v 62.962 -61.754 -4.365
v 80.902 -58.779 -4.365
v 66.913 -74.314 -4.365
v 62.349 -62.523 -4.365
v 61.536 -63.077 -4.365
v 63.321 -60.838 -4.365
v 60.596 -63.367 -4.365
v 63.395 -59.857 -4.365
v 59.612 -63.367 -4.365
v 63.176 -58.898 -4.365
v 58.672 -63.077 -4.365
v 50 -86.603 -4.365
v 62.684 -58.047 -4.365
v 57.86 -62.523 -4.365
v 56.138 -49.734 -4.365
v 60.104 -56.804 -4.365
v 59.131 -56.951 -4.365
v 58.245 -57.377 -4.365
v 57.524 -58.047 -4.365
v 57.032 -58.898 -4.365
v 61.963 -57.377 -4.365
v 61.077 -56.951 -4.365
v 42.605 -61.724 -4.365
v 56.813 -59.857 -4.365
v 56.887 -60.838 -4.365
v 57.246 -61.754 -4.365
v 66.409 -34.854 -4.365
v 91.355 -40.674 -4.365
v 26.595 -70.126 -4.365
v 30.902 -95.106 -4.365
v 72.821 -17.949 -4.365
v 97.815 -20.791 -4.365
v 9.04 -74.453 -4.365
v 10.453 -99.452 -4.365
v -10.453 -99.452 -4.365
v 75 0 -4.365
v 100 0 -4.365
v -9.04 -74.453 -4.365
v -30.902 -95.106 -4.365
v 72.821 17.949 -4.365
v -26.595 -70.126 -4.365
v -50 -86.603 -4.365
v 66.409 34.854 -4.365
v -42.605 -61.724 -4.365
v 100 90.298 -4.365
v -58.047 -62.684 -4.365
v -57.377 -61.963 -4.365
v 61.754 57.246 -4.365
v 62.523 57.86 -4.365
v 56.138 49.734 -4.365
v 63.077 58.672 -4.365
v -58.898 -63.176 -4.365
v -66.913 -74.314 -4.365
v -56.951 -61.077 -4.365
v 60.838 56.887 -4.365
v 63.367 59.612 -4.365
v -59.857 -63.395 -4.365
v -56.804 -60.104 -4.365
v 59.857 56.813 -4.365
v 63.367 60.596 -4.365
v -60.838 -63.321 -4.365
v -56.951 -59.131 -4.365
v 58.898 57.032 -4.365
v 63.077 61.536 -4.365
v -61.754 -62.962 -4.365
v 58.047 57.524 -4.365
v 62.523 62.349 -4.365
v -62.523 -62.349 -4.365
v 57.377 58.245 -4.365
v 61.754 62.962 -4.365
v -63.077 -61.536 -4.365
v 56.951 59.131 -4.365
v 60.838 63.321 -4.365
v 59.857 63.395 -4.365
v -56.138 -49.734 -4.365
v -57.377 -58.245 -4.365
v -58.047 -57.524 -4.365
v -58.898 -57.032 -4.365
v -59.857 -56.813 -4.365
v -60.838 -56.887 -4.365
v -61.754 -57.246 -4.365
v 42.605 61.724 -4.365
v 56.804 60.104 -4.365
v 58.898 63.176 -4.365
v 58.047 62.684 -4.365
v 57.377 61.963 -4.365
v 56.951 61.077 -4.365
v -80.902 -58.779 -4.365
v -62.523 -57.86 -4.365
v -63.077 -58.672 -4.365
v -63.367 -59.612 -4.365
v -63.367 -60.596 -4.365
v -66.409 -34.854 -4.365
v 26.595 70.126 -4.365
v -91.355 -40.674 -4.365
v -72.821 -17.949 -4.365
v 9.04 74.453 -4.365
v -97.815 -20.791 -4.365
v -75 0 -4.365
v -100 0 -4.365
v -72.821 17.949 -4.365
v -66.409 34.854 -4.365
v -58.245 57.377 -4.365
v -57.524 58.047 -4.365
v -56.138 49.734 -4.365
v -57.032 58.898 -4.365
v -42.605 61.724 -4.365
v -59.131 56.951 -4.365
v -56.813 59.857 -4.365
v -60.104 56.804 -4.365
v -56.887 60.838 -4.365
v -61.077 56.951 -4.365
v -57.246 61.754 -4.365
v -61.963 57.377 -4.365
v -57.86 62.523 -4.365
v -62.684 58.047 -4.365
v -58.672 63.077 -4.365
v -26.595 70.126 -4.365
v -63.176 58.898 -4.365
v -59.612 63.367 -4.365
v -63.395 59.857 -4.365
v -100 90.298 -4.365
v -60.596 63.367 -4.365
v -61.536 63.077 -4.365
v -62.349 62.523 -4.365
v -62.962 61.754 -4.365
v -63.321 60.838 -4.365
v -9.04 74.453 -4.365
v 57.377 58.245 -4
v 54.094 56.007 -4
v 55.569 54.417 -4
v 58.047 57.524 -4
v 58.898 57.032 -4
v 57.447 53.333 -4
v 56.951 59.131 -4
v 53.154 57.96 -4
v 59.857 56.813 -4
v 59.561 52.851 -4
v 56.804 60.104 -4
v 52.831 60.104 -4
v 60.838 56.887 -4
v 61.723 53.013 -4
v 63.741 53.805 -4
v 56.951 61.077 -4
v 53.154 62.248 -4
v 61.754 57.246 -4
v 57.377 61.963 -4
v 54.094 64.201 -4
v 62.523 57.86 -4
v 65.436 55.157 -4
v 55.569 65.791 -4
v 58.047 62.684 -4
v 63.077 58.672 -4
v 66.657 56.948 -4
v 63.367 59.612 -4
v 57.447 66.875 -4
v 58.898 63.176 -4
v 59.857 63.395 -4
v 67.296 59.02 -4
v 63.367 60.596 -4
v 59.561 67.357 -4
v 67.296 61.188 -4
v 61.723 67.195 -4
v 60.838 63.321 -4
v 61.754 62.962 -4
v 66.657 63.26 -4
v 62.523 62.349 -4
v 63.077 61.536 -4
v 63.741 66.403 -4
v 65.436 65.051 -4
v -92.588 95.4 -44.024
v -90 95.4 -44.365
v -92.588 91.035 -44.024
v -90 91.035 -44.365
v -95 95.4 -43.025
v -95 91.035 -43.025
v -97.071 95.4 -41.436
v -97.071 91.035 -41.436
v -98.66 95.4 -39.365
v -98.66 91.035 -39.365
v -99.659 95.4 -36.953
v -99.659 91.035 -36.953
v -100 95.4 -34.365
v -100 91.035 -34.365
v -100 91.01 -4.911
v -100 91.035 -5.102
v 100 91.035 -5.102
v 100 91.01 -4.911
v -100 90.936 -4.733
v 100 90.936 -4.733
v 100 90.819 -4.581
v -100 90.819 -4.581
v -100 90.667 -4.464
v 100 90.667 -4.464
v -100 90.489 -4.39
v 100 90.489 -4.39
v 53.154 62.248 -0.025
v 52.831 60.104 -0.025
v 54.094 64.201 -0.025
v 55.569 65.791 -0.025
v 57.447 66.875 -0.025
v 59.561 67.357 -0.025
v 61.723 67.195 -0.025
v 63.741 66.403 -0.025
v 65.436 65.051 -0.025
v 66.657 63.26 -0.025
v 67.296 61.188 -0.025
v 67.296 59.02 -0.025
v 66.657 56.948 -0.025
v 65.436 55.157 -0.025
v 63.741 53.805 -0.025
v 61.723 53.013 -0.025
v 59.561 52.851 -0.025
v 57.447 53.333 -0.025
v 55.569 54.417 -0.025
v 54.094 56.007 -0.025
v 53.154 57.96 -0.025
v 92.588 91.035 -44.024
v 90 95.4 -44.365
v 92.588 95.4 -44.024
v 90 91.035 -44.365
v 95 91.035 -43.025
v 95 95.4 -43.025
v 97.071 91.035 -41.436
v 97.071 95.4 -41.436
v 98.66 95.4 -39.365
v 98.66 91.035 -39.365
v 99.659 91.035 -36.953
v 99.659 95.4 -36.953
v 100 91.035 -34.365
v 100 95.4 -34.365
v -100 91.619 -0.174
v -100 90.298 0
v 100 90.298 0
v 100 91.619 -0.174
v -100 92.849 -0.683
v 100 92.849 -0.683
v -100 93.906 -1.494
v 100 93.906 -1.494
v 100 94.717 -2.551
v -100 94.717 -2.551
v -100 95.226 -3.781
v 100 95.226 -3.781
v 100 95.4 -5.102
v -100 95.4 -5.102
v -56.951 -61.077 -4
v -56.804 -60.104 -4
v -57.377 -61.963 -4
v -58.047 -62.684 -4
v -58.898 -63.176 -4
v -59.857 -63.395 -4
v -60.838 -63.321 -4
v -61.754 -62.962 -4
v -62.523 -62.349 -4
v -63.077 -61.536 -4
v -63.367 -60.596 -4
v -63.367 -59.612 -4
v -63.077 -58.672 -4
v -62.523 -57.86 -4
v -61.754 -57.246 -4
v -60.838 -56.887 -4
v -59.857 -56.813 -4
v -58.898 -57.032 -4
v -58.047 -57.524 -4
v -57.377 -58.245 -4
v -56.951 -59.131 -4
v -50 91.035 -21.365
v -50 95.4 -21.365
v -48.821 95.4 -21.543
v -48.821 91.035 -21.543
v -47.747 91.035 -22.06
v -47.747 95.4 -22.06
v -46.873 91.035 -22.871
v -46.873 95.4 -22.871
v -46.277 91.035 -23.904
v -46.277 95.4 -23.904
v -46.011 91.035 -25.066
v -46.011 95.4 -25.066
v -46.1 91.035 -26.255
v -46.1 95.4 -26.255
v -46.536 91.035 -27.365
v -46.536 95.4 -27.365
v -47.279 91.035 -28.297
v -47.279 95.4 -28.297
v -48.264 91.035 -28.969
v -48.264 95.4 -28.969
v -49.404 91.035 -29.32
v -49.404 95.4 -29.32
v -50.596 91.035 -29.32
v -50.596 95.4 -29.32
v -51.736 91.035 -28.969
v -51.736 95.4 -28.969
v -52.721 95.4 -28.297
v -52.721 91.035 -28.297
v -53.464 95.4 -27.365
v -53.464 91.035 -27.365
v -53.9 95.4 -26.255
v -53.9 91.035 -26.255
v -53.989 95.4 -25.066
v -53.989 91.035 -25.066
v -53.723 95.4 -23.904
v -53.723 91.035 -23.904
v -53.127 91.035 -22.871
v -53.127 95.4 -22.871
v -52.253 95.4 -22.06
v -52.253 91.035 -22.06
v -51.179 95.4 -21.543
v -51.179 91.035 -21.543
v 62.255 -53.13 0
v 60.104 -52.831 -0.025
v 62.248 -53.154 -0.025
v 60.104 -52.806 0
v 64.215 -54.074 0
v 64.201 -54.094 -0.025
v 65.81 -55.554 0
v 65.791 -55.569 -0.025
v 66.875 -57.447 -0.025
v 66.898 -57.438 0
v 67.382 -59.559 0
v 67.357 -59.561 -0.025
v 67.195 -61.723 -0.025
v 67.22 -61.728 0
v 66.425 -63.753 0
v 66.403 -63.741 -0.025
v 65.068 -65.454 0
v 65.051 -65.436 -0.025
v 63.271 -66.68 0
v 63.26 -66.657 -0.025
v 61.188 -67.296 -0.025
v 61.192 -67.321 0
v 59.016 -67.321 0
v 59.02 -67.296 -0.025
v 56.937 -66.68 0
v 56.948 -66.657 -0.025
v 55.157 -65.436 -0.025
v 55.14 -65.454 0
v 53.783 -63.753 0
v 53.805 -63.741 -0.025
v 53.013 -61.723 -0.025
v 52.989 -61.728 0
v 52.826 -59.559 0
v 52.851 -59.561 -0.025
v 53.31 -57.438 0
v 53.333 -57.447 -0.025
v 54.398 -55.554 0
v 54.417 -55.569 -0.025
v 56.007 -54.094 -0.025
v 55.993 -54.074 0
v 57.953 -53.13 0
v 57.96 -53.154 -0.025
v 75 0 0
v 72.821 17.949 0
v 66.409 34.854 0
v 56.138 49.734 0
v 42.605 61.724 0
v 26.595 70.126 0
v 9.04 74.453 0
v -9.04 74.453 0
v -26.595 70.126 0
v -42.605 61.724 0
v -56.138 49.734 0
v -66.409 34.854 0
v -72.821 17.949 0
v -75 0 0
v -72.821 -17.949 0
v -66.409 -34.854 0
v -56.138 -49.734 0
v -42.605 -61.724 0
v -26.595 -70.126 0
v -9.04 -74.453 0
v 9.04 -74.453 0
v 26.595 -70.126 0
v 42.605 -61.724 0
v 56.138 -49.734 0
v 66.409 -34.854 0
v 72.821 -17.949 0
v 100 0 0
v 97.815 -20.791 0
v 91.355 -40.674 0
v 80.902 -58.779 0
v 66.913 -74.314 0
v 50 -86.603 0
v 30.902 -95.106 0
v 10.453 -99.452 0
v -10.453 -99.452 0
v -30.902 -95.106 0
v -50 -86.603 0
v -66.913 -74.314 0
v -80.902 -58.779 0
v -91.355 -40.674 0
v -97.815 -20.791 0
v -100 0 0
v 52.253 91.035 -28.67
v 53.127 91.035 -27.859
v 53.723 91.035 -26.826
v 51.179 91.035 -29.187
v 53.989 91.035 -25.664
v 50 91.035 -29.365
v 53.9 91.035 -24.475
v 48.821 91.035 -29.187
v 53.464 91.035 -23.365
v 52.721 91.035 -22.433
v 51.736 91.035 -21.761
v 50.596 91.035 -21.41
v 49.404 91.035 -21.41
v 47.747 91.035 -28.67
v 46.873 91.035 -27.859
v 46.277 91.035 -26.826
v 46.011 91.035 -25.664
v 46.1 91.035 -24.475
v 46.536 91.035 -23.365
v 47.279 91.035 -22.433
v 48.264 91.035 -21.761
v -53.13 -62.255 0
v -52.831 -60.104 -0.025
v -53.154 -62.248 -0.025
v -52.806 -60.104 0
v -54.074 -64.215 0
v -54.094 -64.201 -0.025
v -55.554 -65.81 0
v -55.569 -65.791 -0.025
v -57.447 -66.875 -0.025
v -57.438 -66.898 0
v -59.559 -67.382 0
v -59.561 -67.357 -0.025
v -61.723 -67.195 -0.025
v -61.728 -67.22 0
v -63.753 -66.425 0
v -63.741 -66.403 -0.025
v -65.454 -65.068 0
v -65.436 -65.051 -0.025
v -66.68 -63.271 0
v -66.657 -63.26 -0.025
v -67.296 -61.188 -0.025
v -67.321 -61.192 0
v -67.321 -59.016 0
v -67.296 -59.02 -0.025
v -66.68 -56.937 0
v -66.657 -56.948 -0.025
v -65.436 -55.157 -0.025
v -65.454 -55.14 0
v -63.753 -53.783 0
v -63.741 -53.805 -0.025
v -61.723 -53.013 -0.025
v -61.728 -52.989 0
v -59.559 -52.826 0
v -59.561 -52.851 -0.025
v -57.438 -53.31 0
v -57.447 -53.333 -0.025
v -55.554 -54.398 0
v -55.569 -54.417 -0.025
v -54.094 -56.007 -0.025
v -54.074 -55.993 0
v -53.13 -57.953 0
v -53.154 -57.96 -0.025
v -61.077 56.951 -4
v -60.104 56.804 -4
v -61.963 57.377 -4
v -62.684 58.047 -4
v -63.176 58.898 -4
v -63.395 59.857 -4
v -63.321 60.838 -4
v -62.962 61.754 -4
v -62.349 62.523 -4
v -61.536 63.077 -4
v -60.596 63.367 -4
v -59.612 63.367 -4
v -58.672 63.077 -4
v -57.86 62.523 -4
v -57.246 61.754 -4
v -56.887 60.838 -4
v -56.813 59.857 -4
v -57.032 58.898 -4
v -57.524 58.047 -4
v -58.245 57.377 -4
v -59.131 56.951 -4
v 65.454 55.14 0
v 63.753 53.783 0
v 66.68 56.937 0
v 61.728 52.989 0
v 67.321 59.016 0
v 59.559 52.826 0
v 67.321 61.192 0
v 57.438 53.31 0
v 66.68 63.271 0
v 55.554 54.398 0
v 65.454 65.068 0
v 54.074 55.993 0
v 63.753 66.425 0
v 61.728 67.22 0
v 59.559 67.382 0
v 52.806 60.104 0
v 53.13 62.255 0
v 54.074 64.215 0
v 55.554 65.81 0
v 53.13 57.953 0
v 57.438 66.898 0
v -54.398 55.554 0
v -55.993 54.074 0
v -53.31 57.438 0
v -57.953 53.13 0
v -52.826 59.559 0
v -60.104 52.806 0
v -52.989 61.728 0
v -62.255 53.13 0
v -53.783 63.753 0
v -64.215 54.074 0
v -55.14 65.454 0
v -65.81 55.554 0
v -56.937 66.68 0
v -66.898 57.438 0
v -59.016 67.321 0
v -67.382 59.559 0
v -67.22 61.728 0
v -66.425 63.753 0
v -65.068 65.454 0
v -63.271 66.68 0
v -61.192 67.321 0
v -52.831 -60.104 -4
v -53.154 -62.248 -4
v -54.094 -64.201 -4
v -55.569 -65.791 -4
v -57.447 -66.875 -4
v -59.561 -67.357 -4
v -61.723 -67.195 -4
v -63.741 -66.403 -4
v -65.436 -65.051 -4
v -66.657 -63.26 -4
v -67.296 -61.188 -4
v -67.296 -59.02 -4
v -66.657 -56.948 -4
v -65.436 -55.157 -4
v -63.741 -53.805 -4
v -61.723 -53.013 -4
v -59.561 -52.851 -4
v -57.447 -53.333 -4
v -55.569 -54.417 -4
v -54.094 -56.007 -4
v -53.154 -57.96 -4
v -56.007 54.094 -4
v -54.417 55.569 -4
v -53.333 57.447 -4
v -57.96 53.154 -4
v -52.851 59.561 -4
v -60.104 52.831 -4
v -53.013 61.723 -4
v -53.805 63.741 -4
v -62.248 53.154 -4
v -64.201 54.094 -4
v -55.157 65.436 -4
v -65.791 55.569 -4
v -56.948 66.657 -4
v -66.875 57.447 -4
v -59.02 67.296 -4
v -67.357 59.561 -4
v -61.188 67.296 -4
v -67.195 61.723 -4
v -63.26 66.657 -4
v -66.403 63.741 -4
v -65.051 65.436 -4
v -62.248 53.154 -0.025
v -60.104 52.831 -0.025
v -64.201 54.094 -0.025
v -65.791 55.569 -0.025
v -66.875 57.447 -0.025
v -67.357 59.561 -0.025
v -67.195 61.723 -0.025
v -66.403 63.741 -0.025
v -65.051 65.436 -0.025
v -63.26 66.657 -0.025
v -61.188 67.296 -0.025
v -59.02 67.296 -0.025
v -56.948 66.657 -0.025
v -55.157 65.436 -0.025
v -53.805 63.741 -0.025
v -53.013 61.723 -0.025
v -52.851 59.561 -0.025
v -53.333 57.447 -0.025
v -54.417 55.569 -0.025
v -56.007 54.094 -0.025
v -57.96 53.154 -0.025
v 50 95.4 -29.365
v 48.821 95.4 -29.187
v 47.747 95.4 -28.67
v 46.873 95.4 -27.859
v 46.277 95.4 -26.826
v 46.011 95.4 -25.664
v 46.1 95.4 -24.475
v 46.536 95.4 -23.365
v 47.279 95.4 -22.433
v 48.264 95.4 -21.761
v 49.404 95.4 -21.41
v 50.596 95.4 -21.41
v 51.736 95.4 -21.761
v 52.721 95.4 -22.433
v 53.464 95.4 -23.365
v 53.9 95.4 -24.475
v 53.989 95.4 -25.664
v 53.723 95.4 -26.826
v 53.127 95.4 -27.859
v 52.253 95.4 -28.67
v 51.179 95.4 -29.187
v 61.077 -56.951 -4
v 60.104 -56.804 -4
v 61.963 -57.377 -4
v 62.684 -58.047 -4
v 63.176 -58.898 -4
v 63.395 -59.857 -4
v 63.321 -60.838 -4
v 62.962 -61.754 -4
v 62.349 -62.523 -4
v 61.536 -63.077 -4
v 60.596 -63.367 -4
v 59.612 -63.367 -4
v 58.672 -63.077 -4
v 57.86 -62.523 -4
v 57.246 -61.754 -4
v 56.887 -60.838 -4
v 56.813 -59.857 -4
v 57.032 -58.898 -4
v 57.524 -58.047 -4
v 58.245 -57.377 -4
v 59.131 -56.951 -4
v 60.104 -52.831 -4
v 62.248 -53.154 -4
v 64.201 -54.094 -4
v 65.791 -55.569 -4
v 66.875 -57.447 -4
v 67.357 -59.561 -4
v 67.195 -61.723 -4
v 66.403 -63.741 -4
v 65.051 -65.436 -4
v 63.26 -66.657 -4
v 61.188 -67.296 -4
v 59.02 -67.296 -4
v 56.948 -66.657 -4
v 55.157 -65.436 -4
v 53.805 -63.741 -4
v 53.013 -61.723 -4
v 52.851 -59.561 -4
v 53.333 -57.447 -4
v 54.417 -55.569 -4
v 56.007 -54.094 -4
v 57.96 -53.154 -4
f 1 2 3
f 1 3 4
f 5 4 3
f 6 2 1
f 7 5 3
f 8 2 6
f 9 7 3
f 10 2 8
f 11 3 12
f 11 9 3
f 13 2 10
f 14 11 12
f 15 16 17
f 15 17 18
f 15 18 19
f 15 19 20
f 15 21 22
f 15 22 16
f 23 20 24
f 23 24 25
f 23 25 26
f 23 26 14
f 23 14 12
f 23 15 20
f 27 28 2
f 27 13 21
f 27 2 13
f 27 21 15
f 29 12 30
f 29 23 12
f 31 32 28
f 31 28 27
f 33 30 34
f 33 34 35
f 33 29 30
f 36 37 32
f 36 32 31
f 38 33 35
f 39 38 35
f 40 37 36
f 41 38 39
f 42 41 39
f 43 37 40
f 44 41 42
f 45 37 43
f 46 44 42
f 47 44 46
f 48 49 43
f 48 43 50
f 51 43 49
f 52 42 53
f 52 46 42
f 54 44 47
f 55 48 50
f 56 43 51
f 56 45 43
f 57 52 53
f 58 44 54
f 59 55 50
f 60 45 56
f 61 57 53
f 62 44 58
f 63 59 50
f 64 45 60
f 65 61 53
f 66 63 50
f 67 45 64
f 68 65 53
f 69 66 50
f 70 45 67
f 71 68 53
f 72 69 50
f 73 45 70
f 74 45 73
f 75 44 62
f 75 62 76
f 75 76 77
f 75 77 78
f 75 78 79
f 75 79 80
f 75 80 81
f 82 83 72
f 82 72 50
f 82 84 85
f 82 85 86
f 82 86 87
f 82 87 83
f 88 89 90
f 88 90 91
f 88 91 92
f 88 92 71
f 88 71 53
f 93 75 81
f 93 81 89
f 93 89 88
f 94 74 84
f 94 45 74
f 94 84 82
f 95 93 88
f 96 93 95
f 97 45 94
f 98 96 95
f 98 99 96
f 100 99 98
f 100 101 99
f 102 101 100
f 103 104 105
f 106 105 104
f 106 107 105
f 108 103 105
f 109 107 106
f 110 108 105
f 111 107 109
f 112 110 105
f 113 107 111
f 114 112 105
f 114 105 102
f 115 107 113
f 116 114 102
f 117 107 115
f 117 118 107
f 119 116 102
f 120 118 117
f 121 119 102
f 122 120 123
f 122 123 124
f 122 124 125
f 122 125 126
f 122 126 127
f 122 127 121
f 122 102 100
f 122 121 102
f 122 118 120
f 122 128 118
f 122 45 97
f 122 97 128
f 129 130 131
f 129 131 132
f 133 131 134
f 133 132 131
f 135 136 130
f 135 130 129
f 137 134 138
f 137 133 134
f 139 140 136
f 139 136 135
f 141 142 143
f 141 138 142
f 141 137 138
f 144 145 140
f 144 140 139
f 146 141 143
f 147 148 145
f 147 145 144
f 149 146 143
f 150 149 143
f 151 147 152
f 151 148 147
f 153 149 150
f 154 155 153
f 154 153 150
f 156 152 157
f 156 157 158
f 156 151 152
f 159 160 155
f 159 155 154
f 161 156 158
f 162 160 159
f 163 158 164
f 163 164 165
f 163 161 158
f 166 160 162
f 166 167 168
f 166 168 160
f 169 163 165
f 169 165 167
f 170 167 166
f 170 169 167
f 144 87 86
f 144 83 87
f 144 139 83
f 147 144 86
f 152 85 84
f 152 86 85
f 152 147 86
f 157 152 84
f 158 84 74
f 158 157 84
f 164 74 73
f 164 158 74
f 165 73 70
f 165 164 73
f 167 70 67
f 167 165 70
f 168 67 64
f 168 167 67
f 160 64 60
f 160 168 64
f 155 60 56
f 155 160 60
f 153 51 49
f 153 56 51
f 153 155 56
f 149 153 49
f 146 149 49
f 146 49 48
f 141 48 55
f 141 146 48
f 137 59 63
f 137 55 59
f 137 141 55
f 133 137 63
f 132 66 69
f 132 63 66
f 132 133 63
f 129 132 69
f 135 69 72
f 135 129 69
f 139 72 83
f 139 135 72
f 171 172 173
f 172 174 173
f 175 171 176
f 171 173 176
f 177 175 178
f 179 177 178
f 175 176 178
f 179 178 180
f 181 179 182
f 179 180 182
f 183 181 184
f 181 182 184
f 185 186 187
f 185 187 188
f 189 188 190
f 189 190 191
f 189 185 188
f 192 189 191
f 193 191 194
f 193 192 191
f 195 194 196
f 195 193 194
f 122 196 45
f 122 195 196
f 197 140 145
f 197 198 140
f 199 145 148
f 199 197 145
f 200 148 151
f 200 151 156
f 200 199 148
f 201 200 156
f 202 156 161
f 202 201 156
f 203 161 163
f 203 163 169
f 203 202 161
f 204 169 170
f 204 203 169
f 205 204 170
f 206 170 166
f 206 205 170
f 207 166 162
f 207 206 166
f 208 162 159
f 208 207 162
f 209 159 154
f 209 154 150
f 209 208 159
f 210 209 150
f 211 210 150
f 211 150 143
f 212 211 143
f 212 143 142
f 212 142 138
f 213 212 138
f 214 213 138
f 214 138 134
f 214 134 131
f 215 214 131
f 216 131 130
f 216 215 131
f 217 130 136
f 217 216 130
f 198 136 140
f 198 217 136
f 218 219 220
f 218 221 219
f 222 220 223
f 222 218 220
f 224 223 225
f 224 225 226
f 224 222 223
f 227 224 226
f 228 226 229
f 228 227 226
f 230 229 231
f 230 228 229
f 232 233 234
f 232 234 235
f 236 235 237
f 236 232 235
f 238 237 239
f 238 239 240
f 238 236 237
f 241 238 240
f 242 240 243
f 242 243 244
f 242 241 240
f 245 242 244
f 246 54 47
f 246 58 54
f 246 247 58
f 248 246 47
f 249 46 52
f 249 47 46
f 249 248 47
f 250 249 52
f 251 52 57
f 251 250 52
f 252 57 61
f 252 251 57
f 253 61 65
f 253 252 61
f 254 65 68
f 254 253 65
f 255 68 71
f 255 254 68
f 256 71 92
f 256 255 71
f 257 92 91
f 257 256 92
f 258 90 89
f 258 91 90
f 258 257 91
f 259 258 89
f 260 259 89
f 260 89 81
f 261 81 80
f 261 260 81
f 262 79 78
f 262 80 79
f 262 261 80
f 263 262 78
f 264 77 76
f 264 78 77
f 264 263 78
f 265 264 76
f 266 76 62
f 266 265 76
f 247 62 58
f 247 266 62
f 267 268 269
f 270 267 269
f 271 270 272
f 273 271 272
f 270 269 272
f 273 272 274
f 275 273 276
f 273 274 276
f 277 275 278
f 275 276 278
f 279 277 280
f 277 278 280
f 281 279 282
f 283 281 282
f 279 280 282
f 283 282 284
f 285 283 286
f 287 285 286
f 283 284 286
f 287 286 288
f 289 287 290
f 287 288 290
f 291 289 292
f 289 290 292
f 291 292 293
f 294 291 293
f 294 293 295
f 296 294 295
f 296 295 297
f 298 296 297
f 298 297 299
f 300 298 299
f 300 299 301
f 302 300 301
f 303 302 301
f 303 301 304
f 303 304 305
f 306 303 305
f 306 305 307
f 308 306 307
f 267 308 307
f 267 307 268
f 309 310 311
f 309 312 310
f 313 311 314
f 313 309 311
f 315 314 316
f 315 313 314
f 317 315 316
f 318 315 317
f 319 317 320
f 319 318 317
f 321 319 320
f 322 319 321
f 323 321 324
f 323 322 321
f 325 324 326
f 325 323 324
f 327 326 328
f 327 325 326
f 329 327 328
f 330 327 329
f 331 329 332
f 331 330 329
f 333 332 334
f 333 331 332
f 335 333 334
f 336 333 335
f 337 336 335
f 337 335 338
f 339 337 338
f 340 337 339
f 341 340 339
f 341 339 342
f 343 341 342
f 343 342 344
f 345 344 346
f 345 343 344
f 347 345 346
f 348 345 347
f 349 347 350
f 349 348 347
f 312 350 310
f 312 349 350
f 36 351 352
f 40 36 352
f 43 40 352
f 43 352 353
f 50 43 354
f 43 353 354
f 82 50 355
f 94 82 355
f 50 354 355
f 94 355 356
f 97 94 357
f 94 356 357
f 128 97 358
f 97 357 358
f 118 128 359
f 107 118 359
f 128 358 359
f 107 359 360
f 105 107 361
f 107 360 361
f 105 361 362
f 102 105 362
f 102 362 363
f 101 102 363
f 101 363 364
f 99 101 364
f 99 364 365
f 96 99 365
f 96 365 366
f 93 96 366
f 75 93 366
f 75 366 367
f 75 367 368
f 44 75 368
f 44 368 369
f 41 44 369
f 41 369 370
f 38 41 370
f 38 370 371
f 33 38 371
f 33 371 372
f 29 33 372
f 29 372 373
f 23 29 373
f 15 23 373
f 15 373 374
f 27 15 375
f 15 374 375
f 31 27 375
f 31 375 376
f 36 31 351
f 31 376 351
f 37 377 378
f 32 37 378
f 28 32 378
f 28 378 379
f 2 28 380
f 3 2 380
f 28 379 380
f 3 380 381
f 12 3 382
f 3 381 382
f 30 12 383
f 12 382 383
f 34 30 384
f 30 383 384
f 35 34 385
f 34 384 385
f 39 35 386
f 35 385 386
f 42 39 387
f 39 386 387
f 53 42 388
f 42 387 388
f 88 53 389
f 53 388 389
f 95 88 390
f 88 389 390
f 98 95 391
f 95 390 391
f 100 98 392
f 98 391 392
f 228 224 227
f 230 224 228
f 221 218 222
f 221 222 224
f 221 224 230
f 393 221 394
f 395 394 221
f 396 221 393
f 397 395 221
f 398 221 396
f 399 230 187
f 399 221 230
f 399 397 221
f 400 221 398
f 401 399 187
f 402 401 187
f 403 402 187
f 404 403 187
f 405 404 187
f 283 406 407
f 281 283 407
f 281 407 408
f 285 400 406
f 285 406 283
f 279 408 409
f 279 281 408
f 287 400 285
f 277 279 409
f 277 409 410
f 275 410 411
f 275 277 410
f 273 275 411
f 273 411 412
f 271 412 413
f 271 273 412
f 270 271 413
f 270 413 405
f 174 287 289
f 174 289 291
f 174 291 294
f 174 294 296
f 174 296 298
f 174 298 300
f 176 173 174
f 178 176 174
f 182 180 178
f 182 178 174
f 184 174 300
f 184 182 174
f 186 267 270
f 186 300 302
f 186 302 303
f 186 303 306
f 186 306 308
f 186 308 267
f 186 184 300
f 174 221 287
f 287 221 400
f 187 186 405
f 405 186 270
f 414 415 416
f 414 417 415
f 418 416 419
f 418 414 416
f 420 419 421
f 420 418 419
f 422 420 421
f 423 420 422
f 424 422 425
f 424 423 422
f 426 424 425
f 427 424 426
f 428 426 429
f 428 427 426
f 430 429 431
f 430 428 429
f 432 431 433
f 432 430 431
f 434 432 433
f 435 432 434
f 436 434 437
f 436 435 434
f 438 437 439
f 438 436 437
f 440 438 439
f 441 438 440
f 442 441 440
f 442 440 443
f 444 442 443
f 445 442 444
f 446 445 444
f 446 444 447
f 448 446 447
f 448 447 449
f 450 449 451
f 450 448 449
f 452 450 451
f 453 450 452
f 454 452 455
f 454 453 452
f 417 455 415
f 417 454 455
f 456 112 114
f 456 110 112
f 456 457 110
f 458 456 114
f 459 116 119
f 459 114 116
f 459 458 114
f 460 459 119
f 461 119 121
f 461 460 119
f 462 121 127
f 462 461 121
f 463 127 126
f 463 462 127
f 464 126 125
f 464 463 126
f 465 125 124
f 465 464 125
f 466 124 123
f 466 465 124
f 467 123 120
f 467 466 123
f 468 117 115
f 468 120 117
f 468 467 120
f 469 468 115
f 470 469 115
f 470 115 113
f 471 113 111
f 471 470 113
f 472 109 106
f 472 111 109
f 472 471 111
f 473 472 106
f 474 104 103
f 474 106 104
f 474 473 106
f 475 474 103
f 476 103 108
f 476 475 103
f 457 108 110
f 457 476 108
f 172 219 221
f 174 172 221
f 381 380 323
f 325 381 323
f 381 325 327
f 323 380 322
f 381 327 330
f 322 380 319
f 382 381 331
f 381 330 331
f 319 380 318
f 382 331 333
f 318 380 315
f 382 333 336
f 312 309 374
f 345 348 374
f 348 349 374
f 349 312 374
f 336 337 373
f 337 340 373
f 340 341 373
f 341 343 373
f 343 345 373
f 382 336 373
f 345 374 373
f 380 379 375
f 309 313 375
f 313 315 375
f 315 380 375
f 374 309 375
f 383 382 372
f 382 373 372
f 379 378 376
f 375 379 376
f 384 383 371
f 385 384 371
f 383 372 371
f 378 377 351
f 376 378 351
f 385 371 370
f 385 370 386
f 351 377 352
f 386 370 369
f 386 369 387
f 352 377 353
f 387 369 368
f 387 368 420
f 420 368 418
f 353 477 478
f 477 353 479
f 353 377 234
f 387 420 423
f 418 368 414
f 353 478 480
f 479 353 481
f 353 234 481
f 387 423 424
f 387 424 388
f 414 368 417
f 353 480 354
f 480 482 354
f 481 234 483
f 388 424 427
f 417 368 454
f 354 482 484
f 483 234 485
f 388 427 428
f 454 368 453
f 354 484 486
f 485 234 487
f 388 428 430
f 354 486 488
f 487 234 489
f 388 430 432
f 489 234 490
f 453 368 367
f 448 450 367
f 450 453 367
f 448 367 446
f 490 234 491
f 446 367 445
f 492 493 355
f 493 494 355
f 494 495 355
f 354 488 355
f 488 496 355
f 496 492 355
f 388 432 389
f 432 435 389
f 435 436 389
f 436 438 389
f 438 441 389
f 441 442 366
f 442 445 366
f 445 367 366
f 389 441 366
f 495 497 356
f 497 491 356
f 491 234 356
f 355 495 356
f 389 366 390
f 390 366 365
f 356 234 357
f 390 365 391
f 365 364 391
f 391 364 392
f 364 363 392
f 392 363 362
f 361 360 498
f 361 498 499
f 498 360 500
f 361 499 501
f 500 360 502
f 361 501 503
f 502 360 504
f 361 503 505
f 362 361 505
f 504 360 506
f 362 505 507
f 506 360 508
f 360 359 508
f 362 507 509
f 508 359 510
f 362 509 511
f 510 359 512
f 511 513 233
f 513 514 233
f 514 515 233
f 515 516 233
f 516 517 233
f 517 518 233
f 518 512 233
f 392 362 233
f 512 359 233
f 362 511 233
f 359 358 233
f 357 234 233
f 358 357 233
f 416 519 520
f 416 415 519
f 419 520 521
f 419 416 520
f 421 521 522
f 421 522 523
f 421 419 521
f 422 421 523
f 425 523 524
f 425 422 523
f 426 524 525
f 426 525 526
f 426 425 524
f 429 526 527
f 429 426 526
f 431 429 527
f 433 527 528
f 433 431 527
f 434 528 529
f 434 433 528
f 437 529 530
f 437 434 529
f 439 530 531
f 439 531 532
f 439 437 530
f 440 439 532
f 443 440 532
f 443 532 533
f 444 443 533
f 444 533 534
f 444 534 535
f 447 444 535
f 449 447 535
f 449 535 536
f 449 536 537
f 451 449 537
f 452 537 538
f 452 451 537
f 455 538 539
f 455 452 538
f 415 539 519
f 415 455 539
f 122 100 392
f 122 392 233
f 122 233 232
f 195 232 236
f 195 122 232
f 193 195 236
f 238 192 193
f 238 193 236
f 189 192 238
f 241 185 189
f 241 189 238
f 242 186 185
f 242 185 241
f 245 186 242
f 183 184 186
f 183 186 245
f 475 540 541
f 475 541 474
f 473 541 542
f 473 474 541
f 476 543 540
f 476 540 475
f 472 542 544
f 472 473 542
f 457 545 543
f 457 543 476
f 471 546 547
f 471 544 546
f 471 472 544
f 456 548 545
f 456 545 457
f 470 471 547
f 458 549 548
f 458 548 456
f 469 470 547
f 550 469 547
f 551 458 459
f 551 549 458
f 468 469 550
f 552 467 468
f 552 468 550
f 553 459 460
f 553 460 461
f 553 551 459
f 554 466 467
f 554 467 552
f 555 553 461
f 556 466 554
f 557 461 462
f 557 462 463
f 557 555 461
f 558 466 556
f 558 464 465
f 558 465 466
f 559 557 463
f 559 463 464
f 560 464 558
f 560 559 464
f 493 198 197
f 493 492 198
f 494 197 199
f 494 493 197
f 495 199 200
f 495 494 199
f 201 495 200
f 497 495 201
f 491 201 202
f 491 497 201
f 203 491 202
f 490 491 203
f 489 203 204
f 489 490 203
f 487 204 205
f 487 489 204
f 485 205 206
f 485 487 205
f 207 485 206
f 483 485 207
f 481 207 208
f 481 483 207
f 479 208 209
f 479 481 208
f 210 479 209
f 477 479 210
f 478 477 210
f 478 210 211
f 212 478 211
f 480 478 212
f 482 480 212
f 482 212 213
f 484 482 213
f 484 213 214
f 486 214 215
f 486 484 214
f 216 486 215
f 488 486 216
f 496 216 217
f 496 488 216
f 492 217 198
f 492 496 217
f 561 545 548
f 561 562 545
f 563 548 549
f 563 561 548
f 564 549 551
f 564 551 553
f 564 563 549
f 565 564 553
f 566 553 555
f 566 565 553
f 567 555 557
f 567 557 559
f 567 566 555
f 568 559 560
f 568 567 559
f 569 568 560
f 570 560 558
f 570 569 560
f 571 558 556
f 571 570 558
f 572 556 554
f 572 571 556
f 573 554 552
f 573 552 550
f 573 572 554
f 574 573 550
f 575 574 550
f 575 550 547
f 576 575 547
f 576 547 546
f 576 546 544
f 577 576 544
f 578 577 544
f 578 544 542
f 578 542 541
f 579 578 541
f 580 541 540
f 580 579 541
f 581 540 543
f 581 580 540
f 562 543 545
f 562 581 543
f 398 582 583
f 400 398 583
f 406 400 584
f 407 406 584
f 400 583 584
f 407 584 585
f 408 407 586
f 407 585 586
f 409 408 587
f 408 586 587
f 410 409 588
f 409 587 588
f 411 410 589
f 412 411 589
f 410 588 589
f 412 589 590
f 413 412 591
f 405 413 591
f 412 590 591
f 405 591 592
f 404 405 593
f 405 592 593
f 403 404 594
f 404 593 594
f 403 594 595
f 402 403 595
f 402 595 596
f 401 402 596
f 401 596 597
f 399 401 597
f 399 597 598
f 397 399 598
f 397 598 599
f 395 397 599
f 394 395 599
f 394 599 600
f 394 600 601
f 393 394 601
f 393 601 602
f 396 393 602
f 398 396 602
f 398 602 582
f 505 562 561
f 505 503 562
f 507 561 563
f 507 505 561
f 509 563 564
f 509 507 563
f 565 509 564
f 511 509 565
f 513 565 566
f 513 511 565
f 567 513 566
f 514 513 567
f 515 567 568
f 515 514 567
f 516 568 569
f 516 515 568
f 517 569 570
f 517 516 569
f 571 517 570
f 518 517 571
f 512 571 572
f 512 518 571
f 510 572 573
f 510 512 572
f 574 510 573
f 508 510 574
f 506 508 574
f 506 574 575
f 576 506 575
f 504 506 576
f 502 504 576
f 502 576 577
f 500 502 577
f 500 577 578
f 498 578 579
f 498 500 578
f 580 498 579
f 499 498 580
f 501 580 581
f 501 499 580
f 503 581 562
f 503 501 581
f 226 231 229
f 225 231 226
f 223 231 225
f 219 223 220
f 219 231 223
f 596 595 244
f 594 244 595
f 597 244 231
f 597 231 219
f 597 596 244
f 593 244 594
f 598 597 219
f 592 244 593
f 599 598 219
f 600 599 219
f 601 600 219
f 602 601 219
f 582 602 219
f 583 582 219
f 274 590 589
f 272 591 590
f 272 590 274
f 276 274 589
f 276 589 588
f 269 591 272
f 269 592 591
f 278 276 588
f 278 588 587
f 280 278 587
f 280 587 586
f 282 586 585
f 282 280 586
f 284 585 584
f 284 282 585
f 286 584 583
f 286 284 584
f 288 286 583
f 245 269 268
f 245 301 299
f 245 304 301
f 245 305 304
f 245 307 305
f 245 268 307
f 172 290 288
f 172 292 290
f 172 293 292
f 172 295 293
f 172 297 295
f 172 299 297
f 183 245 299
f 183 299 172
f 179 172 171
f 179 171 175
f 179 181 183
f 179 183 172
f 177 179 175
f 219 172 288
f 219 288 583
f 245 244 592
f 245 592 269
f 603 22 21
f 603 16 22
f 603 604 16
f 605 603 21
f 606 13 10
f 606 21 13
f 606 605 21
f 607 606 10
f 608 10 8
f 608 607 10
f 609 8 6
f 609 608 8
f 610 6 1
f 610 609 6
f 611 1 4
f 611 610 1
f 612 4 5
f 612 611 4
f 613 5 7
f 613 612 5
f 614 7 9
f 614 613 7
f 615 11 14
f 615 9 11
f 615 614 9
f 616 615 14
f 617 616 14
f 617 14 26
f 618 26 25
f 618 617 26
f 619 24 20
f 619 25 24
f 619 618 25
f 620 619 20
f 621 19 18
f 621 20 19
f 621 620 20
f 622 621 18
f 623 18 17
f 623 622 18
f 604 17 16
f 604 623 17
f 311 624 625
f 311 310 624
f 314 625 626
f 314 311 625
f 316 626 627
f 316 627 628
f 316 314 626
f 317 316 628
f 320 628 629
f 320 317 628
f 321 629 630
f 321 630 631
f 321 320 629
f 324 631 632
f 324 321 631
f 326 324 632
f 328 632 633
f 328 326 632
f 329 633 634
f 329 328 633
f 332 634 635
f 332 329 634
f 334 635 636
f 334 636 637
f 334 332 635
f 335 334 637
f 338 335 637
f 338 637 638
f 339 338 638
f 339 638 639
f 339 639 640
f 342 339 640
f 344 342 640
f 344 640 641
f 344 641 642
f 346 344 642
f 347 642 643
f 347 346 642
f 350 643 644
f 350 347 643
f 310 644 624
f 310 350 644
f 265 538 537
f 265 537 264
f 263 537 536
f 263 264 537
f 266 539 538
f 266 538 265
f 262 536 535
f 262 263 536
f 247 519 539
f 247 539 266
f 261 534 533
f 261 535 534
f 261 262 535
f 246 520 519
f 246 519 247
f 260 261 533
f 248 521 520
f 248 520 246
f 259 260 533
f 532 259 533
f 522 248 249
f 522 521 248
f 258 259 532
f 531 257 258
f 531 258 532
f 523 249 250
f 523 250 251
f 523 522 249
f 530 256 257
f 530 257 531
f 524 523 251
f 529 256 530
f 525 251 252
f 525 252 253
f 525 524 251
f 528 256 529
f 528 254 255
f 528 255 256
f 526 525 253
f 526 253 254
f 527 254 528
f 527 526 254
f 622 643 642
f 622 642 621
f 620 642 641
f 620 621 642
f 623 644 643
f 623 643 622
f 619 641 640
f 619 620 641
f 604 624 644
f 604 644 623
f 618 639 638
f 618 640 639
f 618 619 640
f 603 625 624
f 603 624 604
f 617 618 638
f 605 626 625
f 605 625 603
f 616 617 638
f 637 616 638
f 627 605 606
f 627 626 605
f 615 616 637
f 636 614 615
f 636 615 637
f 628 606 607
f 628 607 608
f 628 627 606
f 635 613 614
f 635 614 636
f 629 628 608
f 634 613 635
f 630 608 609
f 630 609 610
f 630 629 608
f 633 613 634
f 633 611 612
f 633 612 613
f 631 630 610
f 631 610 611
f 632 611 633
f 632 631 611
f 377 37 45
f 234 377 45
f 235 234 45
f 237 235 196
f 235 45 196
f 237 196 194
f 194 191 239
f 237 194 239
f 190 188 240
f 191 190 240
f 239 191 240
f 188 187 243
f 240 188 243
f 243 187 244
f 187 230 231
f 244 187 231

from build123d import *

# Parameters (mm, degrees)
BASE_FLANGE1_DEPTH           = 4.365
EDGE_FLANGE1_STRIP_W         = 18.9332
EDGE_FLANGE1_STRIP_H         = 4.365
EDGE_FLANGE1_STRIP_CUT_DEPTH = 200
EDGE_FLANGE1_DEPTH           = 200
SKETCH10_R                   = 75
CUT_EXTRUDE1_DEPTH           = 10
FILLET1_R                    = 10
SKETCH12_R                   = 4
CUT_EXTRUDE3_DEPTH           = 10
CIRPATTERN1_COUNT            = 4


# Sheet-metal steps are written as plain solids
with BuildPart() as part:
    # Sketch2 → Base-Flange1 (new body)
    with BuildSketch(Plane.XY):
        with BuildLine():
            Line((-100, 0), (-100, 95.4))
            Line((-100, 95.4), (100, 95.4))
            Line((100, 95.4), (100, 0))
            ThreePointArc((100, 0), (0, -100), (-100, 0))
        make_face()
    extrude(amount=-BASE_FLANGE1_DEPTH)

    # Edge-Flange1 strip (across the edge) → Edge-Flange1 strip cut (cut)
    with BuildSketch(Plane(origin=(-100, 95.4, -4.365), x_dir=(0, -1, 0), z_dir=(1, 0, 0))):
        with Locations((-4.365, -2.1825)):
            Rectangle(EDGE_FLANGE1_STRIP_W, EDGE_FLANGE1_STRIP_H)
    extrude(amount=EDGE_FLANGE1_STRIP_CUT_DEPTH, mode=Mode.SUBTRACT)

    # Edge-Flange1 section (across the edge) → Edge-Flange1 (add)
    with BuildSketch(Plane(origin=(-100, 95.4, -4.365), x_dir=(0, -1, 0), z_dir=(1, 0, 0))):
        with BuildLine():
            Line((0, 0.7366), (0, 40))
            Line((0, 40), (4.365, 40))
            Line((4.365, 40), (4.365, 0.7366))
            ThreePointArc((4.365, 0.7366), (4.580745145, 0.215745145), (5.1016, 0))
            Line((5.1016, 0), (5.1016, -4.365))
            ThreePointArc((5.1016, -4.365), (1.494224045, -2.870775955), (0, 0.7366))
        make_face()
    extrude(amount=EDGE_FLANGE1_DEPTH)

    # Sketch10 → Cut-Extrude1 (cut)
    with BuildSketch(Plane.XY):
        Circle(SKETCH10_R)
    extrude(amount=-CUT_EXTRUDE1_DEPTH, mode=Mode.SUBTRACT)

    # Fillet1
    fillet1_edges = [part.edges().sort_by_distance(p)[0] for p in [
        (-100, 93.2175, -44.365),
        (100, 93.2175, -44.365),
    ]]
    fillet(fillet1_edges, radius=FILLET1_R)

    # Sketch12 → Cut-Extrude3 (cut)
    with BuildSketch(Plane(origin=(0, 95.4, 0), x_dir=(1, 0, 0), z_dir=(0, 1, 0))):
        with Locations(Location((-50, 25.365, 0), (0, 0, 270))):
            Circle(SKETCH12_R)
        with Locations(Location((50, 25.365, 0), (0, 0, 90))):
            Circle(SKETCH12_R)
    extrude(amount=-CUT_EXTRUDE3_DEPTH, mode=Mode.SUBTRACT)

    # Sketch14 → CBORE for M6 Hex Head Screw1 (revolve, cut)
    with BuildSketch(Plane(origin=(-60.104076401, 60.104076401, 0), x_dir=(0, -1, 0), z_dir=(1, 0, 0))):
        Polygon((0, 0), (0, 44.365), (3.3, 44.365), (3.3, 4), (7.2735, 4), (7.2735, 0.025), (7.2985, 0), align=None)
    cbore_for_m6_hex_head_screw1 = revolve(axis=Axis((-60.104076401, 60.104076401, 6.35), (0, 0, -1)), mode=Mode.SUBTRACT)

    # CirPattern1: CBORE for M6 Hex Head Screw1 ×4 about axis
    cirpattern1_axis = Axis((0, 0, 0), (0, 0, 1))
    for i in range(1, CIRPATTERN1_COUNT):
        add(cbore_for_m6_hex_head_screw1.rotate(cirpattern1_axis, i * 360 / CIRPATTERN1_COUNT), mode=Mode.SUBTRACT)


solid = part.part
